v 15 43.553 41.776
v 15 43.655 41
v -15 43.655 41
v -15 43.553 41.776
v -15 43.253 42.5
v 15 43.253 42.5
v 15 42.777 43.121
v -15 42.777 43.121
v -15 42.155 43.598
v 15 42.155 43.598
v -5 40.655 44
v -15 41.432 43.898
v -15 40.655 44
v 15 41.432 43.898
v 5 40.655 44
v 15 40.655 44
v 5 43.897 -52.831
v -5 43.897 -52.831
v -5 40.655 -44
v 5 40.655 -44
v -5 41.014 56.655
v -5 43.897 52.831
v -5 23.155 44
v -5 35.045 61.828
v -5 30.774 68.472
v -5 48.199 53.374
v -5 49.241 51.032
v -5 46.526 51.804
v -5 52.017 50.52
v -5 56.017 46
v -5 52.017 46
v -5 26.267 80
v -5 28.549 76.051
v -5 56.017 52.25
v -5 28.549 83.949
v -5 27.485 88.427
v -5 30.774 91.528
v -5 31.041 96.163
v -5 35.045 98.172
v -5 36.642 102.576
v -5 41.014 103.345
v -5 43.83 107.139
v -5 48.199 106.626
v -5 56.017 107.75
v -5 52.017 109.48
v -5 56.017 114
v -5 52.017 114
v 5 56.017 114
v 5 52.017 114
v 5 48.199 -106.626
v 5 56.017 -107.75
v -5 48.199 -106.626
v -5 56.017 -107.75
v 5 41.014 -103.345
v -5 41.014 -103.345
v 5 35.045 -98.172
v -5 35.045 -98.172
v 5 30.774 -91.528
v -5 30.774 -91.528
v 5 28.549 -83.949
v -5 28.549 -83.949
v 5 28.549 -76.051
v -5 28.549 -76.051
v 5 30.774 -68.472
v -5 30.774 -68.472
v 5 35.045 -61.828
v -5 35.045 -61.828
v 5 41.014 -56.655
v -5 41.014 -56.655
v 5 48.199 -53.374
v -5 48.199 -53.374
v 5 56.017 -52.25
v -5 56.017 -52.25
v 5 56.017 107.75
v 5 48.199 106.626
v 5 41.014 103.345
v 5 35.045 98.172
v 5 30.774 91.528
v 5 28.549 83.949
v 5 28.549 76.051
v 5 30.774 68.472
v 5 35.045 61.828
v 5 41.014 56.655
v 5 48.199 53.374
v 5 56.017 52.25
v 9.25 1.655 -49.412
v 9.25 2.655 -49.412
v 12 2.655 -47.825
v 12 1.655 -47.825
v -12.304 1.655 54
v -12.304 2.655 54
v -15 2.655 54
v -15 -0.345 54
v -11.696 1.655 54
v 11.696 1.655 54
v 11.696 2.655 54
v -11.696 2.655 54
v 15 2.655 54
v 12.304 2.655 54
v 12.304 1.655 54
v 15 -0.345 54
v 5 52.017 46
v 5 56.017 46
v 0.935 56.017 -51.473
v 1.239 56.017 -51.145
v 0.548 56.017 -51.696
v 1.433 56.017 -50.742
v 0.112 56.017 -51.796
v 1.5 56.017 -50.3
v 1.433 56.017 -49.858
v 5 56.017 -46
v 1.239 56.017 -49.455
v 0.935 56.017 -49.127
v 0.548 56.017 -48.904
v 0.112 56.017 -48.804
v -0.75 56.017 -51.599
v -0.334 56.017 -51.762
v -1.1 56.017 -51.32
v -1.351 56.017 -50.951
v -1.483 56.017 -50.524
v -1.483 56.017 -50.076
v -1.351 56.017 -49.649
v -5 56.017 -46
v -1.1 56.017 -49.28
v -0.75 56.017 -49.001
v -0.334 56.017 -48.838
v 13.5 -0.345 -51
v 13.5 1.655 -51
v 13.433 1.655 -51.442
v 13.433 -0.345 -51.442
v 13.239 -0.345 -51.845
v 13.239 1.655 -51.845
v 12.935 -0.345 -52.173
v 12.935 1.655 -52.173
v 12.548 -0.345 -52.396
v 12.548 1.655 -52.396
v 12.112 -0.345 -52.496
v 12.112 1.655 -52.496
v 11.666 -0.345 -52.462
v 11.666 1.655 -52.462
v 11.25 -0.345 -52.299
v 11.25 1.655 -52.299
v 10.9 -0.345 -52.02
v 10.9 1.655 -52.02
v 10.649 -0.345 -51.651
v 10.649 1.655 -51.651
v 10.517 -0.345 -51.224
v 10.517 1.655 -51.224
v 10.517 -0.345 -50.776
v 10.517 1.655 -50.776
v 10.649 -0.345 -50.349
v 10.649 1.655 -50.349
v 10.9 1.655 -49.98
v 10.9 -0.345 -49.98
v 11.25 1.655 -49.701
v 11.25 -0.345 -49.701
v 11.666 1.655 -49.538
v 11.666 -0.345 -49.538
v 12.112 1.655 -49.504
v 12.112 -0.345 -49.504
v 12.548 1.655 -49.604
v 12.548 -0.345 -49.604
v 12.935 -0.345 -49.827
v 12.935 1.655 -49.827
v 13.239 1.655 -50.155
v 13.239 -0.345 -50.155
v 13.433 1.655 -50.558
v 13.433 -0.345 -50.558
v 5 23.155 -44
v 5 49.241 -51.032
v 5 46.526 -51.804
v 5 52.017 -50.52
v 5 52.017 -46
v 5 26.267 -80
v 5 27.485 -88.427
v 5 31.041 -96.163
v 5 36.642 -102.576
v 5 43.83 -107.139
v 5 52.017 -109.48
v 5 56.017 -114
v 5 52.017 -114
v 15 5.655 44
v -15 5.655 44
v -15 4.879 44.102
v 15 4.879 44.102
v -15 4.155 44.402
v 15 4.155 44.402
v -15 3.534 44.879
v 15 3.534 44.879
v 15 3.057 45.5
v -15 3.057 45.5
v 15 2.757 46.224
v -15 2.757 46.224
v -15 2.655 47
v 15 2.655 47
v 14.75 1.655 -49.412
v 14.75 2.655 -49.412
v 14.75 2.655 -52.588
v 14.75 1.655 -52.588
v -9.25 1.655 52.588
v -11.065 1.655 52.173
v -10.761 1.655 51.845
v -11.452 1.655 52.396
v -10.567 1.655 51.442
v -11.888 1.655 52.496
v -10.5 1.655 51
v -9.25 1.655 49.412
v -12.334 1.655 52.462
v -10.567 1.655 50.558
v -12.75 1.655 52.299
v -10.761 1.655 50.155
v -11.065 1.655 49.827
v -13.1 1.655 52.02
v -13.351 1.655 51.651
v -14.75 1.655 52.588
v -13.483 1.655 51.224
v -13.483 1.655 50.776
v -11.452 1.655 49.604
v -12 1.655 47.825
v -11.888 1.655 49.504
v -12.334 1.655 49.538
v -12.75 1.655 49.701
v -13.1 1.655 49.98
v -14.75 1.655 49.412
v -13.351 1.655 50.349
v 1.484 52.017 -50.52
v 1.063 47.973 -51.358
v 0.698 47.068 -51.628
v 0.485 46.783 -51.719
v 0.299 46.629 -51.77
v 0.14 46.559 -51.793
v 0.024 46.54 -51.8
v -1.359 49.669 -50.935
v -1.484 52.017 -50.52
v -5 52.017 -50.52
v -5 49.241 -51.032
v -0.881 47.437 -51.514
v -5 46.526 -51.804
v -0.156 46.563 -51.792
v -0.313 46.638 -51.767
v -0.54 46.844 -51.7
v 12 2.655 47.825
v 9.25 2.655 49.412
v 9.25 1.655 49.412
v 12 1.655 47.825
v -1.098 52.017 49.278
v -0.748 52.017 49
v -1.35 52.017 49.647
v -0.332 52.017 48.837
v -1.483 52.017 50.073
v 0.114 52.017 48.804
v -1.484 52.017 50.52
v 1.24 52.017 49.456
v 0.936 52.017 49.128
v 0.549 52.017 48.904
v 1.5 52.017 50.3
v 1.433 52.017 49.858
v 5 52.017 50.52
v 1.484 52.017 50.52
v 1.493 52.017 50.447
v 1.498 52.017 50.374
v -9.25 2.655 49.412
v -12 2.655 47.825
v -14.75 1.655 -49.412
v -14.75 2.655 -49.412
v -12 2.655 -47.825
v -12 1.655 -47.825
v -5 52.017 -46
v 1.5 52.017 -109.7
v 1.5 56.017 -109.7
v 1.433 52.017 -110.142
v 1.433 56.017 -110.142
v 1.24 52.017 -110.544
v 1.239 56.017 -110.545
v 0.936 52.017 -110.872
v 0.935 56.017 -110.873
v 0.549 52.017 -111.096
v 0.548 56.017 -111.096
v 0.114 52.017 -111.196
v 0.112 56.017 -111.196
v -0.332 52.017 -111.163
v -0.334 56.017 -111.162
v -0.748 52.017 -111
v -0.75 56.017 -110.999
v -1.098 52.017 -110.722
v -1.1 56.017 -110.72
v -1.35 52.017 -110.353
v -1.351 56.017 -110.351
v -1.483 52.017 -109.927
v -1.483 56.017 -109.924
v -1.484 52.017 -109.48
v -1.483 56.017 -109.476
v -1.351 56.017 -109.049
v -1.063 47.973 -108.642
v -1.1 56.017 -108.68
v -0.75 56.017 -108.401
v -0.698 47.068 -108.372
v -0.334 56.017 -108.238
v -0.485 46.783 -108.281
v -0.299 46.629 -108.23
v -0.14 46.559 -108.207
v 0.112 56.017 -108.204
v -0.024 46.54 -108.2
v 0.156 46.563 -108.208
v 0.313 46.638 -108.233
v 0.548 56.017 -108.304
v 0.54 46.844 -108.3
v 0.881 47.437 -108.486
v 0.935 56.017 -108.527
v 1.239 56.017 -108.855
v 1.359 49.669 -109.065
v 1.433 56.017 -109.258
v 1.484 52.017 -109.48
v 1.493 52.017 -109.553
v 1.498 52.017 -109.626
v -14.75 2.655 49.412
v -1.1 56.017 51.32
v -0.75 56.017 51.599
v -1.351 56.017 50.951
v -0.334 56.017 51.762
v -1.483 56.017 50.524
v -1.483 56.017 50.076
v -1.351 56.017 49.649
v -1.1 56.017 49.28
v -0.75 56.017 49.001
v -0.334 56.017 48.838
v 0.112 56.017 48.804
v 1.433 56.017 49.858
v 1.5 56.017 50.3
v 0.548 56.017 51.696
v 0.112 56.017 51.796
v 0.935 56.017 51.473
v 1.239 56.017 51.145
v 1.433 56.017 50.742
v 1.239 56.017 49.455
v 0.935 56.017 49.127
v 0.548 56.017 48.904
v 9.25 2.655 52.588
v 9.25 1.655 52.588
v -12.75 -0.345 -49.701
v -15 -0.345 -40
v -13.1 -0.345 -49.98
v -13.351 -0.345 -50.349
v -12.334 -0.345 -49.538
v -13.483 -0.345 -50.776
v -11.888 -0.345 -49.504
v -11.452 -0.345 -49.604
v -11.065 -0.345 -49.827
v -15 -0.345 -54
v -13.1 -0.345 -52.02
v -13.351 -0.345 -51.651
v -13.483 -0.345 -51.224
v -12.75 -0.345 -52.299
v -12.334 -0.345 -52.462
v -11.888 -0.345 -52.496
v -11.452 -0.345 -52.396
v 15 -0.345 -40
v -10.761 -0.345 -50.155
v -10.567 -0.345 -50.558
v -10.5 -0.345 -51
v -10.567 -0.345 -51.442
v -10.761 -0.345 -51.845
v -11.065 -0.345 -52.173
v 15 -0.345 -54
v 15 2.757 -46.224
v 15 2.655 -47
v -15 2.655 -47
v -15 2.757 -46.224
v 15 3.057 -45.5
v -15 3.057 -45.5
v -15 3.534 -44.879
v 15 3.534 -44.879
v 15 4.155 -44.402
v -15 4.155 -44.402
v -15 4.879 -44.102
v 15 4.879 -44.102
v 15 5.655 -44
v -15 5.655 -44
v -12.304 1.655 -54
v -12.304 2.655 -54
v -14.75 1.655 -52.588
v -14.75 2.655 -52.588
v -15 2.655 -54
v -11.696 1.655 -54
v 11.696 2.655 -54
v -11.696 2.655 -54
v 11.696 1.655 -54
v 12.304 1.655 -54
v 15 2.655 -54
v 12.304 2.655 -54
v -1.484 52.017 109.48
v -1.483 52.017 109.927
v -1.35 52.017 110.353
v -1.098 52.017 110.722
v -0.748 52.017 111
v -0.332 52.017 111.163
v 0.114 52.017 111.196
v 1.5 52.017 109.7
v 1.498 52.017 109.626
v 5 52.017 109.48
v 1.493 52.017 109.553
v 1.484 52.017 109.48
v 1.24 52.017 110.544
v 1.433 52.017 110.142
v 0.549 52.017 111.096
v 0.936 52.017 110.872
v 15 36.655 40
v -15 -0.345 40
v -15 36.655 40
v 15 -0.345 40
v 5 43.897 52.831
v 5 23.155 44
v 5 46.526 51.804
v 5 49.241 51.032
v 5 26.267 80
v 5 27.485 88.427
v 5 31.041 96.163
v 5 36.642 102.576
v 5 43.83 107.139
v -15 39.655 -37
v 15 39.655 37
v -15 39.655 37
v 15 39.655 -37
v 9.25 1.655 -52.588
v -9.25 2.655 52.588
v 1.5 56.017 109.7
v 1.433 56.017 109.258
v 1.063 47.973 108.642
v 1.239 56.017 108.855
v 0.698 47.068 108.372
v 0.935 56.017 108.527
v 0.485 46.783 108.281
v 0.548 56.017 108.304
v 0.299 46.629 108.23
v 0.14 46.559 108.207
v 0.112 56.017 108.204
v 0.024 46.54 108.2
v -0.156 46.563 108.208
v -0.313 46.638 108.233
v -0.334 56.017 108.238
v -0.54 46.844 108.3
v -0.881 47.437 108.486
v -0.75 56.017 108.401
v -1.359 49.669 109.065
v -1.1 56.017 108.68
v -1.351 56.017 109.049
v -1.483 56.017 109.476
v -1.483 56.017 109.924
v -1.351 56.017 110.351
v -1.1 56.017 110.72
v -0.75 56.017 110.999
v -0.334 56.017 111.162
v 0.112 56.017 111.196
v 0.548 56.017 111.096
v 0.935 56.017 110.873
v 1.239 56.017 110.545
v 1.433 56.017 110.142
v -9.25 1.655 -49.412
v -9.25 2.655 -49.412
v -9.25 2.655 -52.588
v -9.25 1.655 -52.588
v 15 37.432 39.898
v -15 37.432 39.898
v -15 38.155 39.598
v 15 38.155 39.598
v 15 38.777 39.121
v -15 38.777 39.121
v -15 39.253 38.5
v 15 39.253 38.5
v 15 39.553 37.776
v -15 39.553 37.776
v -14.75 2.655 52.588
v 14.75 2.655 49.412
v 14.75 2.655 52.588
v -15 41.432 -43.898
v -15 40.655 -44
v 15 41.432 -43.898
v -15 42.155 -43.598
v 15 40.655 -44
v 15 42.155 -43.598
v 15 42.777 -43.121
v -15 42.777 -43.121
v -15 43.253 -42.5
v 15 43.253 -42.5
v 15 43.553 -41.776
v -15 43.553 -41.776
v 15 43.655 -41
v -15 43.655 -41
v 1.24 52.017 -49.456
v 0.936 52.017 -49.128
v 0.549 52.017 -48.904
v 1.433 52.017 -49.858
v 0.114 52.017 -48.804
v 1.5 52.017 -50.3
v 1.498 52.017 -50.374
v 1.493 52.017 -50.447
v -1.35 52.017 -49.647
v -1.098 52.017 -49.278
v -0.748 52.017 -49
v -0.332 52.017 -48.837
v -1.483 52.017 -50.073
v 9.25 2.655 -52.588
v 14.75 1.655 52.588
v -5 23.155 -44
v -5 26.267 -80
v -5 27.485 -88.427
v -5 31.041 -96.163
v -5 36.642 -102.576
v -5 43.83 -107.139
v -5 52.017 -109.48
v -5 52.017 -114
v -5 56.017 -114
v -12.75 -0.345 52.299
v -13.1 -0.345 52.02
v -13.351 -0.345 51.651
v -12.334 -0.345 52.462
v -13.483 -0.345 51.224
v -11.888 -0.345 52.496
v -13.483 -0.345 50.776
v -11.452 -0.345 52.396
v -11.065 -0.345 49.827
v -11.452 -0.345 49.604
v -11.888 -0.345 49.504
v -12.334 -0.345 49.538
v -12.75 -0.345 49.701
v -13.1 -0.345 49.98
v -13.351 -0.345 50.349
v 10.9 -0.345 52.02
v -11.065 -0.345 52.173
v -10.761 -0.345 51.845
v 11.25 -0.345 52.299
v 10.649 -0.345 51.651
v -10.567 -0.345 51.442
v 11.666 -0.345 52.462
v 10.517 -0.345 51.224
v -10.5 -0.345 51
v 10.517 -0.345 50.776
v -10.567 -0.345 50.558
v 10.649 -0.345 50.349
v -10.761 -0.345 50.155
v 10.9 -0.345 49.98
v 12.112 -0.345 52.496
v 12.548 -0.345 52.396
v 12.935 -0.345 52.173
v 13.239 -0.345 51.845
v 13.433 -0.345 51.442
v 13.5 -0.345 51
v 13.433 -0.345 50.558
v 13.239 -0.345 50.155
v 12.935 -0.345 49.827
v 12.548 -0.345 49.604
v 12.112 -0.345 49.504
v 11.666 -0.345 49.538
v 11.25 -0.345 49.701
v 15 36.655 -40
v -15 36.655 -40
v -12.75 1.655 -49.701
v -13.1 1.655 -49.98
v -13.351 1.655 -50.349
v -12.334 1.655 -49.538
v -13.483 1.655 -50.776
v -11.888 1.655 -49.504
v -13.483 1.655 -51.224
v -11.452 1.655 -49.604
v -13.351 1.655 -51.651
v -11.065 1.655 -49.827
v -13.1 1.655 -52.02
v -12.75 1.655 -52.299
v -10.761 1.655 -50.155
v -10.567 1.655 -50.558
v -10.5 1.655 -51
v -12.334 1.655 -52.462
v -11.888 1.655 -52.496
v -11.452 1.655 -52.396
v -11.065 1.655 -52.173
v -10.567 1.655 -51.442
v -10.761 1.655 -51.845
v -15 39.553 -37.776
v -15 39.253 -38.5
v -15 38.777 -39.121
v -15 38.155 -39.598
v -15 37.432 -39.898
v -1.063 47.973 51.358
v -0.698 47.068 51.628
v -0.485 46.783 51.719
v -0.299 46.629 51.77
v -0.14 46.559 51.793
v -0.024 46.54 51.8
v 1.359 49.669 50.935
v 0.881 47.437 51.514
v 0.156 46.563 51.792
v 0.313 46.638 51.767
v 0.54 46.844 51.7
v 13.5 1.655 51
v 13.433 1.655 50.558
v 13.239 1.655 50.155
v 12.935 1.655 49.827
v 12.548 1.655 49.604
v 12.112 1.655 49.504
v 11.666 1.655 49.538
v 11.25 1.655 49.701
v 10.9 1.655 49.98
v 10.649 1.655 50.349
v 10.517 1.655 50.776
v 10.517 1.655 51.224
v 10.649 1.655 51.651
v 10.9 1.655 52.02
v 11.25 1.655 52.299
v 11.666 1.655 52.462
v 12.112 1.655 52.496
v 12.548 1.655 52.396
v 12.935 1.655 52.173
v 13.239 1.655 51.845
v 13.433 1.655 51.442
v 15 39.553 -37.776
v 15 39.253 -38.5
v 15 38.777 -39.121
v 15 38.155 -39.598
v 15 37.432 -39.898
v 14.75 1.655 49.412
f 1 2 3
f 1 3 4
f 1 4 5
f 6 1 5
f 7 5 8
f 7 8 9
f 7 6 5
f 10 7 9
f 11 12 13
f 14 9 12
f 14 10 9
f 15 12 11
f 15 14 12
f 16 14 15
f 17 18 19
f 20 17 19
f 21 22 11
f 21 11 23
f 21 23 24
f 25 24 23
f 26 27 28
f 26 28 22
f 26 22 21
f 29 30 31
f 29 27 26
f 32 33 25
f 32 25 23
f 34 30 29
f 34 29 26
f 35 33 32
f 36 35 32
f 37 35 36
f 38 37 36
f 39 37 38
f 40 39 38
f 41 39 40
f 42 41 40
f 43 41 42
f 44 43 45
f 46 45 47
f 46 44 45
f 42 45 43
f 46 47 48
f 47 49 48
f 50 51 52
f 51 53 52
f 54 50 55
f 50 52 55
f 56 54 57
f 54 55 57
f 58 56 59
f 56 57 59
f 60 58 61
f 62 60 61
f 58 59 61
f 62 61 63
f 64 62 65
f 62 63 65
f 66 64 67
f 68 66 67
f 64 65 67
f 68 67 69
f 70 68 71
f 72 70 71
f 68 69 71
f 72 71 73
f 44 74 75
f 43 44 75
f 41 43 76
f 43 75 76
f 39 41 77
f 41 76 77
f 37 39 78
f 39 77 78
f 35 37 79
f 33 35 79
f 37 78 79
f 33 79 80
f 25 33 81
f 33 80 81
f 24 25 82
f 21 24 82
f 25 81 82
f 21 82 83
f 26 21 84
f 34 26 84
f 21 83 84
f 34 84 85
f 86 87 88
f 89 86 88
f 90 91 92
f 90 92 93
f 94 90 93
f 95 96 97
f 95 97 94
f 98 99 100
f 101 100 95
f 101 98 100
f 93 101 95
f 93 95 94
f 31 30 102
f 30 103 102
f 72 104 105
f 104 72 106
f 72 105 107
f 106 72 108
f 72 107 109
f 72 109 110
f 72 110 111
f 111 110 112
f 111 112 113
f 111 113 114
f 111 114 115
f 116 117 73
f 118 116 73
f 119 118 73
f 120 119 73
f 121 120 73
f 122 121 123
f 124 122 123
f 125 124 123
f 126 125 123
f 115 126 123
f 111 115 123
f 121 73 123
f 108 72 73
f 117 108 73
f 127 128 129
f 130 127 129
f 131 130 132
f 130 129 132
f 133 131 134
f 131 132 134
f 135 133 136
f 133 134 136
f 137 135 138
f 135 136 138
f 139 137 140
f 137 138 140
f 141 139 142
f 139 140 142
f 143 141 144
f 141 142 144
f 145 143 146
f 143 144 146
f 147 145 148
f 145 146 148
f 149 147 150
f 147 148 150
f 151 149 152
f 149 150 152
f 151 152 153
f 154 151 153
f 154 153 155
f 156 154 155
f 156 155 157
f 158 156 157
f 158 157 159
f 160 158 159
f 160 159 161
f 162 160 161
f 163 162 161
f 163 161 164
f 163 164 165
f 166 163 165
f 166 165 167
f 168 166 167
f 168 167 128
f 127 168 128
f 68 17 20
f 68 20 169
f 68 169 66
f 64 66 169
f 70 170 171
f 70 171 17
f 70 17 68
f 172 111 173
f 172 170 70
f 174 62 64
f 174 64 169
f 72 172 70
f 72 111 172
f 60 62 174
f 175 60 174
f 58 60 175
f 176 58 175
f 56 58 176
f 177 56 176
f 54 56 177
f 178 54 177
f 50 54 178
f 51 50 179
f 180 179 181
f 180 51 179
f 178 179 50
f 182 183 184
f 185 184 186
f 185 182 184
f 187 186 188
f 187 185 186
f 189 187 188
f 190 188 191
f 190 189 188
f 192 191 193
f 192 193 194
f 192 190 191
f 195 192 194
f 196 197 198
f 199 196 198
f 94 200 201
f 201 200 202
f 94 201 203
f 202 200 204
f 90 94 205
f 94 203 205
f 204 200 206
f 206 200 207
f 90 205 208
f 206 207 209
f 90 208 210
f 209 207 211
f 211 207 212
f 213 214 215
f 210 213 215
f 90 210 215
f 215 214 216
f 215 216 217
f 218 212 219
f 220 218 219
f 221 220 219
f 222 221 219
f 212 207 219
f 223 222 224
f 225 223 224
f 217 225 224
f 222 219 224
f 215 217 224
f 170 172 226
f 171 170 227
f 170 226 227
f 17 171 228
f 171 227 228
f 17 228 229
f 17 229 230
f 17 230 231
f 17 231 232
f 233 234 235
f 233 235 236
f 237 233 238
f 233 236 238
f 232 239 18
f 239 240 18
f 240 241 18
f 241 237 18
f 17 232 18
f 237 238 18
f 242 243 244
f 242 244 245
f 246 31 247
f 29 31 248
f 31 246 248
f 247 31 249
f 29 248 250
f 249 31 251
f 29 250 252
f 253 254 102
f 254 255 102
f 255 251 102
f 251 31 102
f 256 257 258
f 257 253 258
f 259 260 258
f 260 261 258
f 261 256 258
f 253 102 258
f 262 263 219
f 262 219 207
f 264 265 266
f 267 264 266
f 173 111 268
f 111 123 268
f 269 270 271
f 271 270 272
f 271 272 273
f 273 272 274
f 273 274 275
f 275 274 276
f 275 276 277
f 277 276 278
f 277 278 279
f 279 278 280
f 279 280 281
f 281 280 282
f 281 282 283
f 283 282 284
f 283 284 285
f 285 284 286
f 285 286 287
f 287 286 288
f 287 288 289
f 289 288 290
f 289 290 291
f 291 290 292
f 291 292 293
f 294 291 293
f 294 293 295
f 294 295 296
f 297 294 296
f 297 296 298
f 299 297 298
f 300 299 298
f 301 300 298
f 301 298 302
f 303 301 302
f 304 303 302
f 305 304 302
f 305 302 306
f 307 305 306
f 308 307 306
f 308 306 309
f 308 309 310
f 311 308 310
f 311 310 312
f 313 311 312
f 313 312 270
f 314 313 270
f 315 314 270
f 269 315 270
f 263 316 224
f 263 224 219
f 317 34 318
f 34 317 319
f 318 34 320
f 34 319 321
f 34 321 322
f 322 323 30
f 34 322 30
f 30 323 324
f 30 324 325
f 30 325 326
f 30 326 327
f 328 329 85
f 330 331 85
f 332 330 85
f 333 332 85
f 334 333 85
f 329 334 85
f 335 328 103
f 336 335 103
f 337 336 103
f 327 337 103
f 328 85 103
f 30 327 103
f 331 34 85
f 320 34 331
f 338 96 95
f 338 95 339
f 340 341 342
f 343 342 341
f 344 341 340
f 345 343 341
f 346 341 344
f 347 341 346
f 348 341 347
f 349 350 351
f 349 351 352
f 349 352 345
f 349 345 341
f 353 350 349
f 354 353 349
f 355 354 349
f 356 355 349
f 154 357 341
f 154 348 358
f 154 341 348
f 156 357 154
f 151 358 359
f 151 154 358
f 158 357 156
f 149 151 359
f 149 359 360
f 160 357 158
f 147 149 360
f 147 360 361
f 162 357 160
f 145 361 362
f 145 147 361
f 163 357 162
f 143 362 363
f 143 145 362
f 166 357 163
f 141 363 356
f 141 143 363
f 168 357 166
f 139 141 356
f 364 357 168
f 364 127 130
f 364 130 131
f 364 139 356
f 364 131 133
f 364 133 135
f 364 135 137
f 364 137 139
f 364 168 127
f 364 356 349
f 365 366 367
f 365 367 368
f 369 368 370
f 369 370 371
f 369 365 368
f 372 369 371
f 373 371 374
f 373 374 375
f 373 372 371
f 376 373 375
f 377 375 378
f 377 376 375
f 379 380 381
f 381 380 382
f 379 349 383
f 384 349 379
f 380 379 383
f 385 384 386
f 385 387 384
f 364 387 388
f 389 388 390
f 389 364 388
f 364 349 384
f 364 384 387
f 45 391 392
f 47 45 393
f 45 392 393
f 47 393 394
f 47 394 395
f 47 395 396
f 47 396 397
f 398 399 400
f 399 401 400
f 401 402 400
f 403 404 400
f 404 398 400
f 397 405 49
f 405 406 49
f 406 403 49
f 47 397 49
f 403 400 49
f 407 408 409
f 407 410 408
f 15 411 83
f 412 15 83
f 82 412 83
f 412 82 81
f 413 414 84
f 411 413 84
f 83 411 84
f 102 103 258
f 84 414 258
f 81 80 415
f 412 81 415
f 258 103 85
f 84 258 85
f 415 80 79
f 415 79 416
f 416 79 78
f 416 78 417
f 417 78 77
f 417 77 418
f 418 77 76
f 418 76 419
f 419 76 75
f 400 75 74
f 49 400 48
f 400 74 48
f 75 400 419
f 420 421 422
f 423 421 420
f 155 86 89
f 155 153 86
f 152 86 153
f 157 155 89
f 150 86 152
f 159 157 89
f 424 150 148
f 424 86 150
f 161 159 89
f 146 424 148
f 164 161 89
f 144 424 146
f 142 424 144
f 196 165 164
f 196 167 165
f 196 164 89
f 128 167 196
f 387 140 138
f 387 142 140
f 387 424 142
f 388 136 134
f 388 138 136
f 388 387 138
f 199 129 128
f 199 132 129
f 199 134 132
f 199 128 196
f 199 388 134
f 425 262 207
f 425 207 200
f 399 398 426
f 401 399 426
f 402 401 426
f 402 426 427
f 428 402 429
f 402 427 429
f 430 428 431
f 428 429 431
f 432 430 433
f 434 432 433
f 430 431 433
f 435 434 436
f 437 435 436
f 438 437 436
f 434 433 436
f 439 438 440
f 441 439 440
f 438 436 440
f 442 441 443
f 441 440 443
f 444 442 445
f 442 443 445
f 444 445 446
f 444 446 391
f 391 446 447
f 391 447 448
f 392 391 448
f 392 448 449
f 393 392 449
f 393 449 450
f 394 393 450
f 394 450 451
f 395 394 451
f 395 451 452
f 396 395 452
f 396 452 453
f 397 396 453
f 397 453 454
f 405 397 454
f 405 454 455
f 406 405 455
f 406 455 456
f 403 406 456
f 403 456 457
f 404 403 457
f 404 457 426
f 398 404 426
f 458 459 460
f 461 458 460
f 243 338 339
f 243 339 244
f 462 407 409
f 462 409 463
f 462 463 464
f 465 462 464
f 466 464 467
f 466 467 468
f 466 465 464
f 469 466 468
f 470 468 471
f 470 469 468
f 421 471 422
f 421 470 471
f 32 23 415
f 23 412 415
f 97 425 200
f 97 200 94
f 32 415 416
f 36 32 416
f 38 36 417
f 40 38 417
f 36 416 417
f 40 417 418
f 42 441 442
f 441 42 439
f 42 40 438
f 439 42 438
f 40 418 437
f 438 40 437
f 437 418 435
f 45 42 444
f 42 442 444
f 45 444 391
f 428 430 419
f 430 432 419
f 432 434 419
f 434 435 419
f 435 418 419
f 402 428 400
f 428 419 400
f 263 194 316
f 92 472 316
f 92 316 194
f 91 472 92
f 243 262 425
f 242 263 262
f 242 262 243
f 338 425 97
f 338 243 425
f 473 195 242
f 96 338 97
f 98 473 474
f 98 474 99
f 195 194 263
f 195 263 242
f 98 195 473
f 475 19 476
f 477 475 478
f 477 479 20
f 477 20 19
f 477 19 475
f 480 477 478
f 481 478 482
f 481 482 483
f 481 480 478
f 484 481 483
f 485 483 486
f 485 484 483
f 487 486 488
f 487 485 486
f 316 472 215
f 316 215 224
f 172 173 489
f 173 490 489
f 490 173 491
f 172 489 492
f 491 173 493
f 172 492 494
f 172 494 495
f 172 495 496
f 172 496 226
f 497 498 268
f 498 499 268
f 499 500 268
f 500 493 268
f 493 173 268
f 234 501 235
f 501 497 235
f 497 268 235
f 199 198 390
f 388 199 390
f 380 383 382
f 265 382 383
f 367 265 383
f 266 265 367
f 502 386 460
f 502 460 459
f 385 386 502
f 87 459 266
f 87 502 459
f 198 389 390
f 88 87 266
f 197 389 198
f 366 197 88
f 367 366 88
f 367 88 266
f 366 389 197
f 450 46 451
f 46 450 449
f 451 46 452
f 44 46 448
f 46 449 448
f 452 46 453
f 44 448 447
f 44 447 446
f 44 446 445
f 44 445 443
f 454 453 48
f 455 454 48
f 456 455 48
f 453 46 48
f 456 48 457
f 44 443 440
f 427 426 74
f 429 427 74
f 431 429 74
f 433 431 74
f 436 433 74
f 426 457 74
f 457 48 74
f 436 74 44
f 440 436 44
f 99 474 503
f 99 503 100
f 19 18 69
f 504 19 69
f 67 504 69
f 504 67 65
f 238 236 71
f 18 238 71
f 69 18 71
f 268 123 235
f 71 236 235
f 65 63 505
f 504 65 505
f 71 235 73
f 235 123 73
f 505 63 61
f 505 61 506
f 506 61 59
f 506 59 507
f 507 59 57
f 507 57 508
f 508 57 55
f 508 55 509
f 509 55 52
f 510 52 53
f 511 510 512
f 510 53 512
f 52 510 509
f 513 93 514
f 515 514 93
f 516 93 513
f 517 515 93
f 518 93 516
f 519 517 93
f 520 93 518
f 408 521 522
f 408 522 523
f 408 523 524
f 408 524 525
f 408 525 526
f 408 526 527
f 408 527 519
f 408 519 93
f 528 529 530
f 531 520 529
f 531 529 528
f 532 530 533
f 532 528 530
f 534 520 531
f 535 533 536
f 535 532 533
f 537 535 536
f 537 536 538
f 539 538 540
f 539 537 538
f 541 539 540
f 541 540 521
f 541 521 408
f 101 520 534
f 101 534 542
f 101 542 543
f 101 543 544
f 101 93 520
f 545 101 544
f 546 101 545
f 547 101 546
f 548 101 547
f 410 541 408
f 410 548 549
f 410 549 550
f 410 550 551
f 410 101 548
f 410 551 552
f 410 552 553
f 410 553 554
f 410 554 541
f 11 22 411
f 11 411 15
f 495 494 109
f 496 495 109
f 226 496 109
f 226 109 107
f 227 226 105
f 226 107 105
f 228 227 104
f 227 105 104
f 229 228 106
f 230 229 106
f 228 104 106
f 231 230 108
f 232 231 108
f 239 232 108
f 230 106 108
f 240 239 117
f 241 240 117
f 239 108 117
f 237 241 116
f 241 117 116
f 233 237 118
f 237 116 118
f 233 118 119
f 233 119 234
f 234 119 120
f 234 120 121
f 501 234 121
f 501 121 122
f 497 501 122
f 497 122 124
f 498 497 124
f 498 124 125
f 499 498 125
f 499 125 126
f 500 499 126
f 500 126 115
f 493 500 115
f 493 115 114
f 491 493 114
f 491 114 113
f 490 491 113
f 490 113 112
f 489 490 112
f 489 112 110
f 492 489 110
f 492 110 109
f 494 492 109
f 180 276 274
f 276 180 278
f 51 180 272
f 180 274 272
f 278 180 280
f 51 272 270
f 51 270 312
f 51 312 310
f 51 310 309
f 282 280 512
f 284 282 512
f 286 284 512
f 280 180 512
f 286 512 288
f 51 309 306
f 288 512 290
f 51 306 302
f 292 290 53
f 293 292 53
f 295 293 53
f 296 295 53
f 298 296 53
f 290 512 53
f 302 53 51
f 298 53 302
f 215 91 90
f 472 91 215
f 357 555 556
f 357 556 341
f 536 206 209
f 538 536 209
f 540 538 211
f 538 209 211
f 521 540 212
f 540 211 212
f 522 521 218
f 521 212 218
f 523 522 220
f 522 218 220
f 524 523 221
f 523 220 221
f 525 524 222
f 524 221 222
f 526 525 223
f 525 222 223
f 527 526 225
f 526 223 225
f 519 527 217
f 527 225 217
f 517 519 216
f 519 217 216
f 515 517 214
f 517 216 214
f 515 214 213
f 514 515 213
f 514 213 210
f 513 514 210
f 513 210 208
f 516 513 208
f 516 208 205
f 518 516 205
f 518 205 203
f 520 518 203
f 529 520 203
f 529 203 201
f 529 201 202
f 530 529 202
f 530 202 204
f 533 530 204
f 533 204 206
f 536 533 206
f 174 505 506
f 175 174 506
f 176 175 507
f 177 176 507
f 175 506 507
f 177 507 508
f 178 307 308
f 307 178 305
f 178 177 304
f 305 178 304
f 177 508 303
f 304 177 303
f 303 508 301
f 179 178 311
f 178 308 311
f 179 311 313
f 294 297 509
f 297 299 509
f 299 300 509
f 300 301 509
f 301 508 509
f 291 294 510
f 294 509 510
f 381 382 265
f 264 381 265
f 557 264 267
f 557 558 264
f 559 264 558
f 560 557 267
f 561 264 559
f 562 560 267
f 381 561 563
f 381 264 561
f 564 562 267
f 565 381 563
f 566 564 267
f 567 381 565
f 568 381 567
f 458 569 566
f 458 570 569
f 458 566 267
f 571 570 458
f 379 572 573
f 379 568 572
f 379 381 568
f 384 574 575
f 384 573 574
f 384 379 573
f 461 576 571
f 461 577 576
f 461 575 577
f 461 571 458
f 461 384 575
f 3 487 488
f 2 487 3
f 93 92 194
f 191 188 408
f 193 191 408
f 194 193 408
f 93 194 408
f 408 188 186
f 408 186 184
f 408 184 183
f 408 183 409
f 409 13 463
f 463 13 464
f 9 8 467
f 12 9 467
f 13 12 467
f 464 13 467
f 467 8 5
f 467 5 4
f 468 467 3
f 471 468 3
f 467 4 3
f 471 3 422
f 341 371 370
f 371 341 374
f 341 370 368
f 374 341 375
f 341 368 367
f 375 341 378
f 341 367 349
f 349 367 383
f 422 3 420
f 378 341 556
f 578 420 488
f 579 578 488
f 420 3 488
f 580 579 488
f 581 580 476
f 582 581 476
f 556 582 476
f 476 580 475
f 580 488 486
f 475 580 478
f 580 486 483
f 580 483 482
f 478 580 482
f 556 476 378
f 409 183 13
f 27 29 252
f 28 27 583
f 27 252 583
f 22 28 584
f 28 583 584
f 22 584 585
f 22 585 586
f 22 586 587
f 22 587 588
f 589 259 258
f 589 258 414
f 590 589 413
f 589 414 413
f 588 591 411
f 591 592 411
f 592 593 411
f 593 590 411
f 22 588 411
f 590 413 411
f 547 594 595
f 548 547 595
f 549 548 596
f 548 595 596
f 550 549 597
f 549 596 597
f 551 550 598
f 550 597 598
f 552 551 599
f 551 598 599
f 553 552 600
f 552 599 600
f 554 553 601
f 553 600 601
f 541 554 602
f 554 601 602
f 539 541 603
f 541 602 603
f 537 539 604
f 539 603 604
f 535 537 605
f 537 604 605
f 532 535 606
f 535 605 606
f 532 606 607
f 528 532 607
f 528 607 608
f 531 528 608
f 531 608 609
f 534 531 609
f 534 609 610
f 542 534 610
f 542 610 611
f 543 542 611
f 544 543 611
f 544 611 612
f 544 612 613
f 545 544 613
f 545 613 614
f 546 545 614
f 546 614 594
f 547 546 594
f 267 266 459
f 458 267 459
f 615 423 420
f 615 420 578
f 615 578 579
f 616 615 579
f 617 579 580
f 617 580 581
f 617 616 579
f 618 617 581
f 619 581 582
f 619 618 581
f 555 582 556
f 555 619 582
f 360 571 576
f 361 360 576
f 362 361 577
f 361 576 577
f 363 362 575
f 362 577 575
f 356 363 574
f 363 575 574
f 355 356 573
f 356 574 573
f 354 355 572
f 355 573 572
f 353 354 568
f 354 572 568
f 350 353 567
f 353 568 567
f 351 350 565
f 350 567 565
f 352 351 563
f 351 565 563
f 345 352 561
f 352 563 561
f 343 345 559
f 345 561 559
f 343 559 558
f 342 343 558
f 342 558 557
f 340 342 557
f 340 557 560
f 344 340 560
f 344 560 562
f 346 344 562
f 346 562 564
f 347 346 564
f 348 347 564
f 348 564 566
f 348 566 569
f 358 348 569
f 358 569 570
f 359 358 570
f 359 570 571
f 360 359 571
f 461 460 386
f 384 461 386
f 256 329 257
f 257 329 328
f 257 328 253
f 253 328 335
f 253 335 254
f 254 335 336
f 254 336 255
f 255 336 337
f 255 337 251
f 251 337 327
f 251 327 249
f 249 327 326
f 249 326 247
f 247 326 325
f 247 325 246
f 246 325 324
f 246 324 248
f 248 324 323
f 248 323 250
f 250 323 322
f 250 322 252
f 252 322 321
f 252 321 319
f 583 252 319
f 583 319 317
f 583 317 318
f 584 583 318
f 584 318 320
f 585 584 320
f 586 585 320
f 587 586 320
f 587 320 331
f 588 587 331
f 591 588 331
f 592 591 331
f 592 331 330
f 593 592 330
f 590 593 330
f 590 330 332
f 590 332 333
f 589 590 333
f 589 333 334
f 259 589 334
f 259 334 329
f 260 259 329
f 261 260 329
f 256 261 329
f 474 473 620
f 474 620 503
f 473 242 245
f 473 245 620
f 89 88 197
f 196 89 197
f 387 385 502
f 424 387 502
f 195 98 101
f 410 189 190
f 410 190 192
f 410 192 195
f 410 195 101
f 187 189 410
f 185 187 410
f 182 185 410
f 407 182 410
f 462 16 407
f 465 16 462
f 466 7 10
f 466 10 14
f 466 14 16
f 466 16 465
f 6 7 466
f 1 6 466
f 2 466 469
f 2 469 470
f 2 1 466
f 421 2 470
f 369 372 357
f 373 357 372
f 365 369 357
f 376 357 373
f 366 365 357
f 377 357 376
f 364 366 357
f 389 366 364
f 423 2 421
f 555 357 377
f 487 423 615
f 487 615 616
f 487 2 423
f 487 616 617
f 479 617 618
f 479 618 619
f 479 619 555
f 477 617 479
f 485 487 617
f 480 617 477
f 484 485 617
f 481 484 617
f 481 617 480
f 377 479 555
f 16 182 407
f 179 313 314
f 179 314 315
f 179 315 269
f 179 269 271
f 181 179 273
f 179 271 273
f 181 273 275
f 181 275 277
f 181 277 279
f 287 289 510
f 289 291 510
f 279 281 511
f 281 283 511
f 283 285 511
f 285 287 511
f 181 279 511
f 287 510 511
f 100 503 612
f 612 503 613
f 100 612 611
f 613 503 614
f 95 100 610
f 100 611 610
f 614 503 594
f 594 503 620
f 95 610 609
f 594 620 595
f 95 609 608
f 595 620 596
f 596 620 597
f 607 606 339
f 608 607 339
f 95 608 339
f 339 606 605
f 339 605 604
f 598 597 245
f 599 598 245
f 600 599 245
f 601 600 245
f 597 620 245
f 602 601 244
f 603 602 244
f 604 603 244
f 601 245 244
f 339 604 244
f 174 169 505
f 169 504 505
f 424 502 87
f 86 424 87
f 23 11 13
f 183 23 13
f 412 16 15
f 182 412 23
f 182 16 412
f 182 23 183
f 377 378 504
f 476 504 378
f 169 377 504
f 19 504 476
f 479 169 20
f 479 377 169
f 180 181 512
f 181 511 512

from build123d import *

# Parameters (mm, degrees)
EXTRUDE_1_DEPTH      = 15
EXTRUDE_1_DEPTH_BACK = 15
EXTRUDE_2_DEPTH      = 5
EXTRUDE_2_DEPTH_BACK = 5
EXTRUDE_2_START      = -15
SKETCH_3_R           = 1.5
CUT_EXTRUDE_1_DEPTH  = 11
SKETCH_4_R           = 1.5
CUT_EXTRUDE_2_DEPTH  = 11
CUT_EXTRUDE_3_DEPTH  = 1


with BuildPart() as part:
    # 草图1 → 凸台-拉伸1 (new, two sides: drawn at the far end of the back side and taken through both)
    with BuildSketch(Plane(origin=(0, 0, 0), x_dir=(0, 0, -1), z_dir=(1, 0, 0)).offset(-EXTRUDE_1_DEPTH_BACK)):
        with BuildLine():
            Line((-40, -0.344795888), (-40, 36.655204112))
            ThreePointArc((-40, 36.655204112), (-39.121320344, 38.776524455), (-37, 39.655204112))
            Line((-37, 39.655204112), (37, 39.655204112))
            ThreePointArc((37, 39.655204112), (39.121320344, 38.776524455), (40, 36.655204112))
            Line((40, 36.655204112), (40, -0.344795888))
            Line((40, -0.344795888), (54, -0.344795888))
            Line((54, -0.344795888), (54, 2.655204112))
            Line((54, 2.655204112), (47, 2.655204112))
            ThreePointArc((47, 2.655204112), (44.878679656, 3.533883768), (44, 5.655204112))
            Line((44, 5.655204112), (44, 40.655204112))
            ThreePointArc((44, 40.655204112), (43.121320344, 42.776524455), (41, 43.655204112))
            Line((41, 43.655204112), (-41, 43.655204112))
            ThreePointArc((-41, 43.655204112), (-43.121320344, 42.776524455), (-44, 40.655204112))
            Line((-44, 40.655204112), (-44, 5.655204112))
            ThreePointArc((-44, 5.655204112), (-44.878679656, 3.533883768), (-47, 2.655204112))
            Line((-47, 2.655204112), (-54, 2.655204112))
            Line((-54, 2.655204112), (-54, -0.344795888))
            Line((-54, -0.344795888), (-40, -0.344795888))
        make_face()
    extrude(amount=EXTRUDE_1_DEPTH + EXTRUDE_1_DEPTH_BACK)

    # 草图2 → 凸台-拉伸2 (add, two sides: drawn at the far end of the back side and taken through both)
    with BuildSketch(Plane(origin=(15, 0, 0), x_dir=(0, 0, -1), z_dir=(1, 0, 0)).offset(EXTRUDE_2_START - EXTRUDE_2_DEPTH_BACK)):
        with BuildLine():
            Line((-52.25, 56.016603057), (-46, 56.016603057))
            Line((-46, 56.016603057), (-46, 52.016603057))
            Line((-46, 52.016603057), (-50.520133989, 52.016603057))
            ThreePointArc((-50.520133989, 52.016603057), (-51.385897915, 47.874388257), (-52.830611648, 43.896915082))
            Line((-52.830611648, 43.896915082), (-44, 40.655204112))
            Line((-44, 40.655204112), (-44, 23.155204112))
            Line((-44, 23.155204112), (-80, 26.266603057))
            ThreePointArc((-80, 26.266603057), (-99.571184175, 33.610549187), (-109.479866011, 52.016603057))
            Line((-109.479866011, 52.016603057), (-114, 52.016603057))
            Line((-114, 52.016603057), (-114, 56.016603057))
            Line((-114, 56.016603057), (-107.75, 56.016603057))
            ThreePointArc((-107.75, 56.016603057), (-80, 28.266603057), (-52.25, 56.016603057))
        make_face()
        with BuildLine():
            Line((52.830611648, 43.896915082), (44, 40.655204112))
            Line((44, 40.655204112), (44, 23.155204112))
            Line((44, 23.155204112), (80, 26.266603057))
            ThreePointArc((80, 26.266603057), (99.571184175, 33.610549187), (109.479866011, 52.016603057))
            Line((109.479866011, 52.016603057), (114, 52.016603057))
            Line((114, 52.016603057), (114, 56.016603057))
            Line((114, 56.016603057), (107.75, 56.016603057))
            ThreePointArc((107.75, 56.016603057), (80, 28.266603057), (52.25, 56.016603057))
            Line((52.25, 56.016603057), (46, 56.016603057))
            Line((46, 56.016603057), (46, 52.016603057))
            Line((46, 52.016603057), (50.520133989, 52.016603057))
            ThreePointArc((50.520133989, 52.016603057), (51.385897915, 47.874388257), (52.830611648, 43.896915082))
        make_face()
    extrude(amount=EXTRUDE_2_DEPTH + EXTRUDE_2_DEPTH_BACK)

    # 草图3 → 切除-拉伸1 (cut)
    with BuildSketch(Plane(origin=(0, 56.016603057, 0), x_dir=(1, 0, 0), z_dir=(0, 1, 0))):
        with Locations((0, 109.7)):
            Circle(SKETCH_3_R)
        with Locations((0, 50.3)):
            Circle(SKETCH_3_R)
        with Locations((0, -50.3)):
            Circle(SKETCH_3_R)
        with Locations((0, -109.7)):
            Circle(SKETCH_3_R)
    extrude(amount=-CUT_EXTRUDE_1_DEPTH, mode=Mode.SUBTRACT)

    # 草图4 → 切除-拉伸2 (cut)
    with BuildSketch(Plane(origin=(0, 2.655204112, 0), x_dir=(1, 0, 0), z_dir=(0, 1, 0))):
        with Locations((-12, -51)):
            Circle(SKETCH_4_R)
        with Locations((12, -51)):
            Circle(SKETCH_4_R)
        with Locations((12, 51)):
            Circle(SKETCH_4_R)
        with Locations((-12, 51)):
            Circle(SKETCH_4_R)
    extrude(amount=-CUT_EXTRUDE_2_DEPTH, mode=Mode.SUBTRACT)

    # 草图5 → 切除-拉伸3 (cut)
    with BuildSketch(Plane(origin=(0, 2.655204112, 0), x_dir=(1, 0, 0), z_dir=(0, 1, 0))):
        Polygon((-12, 54.175426481), (-14.75, 52.58771324), (-14.75, 49.41228676), (-12, 47.824573519), (-9.25, 49.41228676), (-9.25, 52.58771324), align=None)
        Polygon((12, 54.175426481), (9.25, 52.58771324), (9.25, 49.41228676), (12, 47.824573519), (14.75, 49.41228676), (14.75, 52.58771324), align=None)
        Polygon((14.75, -52.58771324), (12, -54.175426481), (9.25, -52.58771324), (9.25, -49.41228676), (12, -47.824573519), (14.75, -49.41228676), align=None)
        Polygon((-9.25, -52.58771324), (-12, -54.175426481), (-14.75, -52.58771324), (-14.75, -49.41228676), (-12, -47.824573519), (-9.25, -49.41228676), align=None)
    extrude(amount=-CUT_EXTRUDE_3_DEPTH, mode=Mode.SUBTRACT)


solid = part.part
